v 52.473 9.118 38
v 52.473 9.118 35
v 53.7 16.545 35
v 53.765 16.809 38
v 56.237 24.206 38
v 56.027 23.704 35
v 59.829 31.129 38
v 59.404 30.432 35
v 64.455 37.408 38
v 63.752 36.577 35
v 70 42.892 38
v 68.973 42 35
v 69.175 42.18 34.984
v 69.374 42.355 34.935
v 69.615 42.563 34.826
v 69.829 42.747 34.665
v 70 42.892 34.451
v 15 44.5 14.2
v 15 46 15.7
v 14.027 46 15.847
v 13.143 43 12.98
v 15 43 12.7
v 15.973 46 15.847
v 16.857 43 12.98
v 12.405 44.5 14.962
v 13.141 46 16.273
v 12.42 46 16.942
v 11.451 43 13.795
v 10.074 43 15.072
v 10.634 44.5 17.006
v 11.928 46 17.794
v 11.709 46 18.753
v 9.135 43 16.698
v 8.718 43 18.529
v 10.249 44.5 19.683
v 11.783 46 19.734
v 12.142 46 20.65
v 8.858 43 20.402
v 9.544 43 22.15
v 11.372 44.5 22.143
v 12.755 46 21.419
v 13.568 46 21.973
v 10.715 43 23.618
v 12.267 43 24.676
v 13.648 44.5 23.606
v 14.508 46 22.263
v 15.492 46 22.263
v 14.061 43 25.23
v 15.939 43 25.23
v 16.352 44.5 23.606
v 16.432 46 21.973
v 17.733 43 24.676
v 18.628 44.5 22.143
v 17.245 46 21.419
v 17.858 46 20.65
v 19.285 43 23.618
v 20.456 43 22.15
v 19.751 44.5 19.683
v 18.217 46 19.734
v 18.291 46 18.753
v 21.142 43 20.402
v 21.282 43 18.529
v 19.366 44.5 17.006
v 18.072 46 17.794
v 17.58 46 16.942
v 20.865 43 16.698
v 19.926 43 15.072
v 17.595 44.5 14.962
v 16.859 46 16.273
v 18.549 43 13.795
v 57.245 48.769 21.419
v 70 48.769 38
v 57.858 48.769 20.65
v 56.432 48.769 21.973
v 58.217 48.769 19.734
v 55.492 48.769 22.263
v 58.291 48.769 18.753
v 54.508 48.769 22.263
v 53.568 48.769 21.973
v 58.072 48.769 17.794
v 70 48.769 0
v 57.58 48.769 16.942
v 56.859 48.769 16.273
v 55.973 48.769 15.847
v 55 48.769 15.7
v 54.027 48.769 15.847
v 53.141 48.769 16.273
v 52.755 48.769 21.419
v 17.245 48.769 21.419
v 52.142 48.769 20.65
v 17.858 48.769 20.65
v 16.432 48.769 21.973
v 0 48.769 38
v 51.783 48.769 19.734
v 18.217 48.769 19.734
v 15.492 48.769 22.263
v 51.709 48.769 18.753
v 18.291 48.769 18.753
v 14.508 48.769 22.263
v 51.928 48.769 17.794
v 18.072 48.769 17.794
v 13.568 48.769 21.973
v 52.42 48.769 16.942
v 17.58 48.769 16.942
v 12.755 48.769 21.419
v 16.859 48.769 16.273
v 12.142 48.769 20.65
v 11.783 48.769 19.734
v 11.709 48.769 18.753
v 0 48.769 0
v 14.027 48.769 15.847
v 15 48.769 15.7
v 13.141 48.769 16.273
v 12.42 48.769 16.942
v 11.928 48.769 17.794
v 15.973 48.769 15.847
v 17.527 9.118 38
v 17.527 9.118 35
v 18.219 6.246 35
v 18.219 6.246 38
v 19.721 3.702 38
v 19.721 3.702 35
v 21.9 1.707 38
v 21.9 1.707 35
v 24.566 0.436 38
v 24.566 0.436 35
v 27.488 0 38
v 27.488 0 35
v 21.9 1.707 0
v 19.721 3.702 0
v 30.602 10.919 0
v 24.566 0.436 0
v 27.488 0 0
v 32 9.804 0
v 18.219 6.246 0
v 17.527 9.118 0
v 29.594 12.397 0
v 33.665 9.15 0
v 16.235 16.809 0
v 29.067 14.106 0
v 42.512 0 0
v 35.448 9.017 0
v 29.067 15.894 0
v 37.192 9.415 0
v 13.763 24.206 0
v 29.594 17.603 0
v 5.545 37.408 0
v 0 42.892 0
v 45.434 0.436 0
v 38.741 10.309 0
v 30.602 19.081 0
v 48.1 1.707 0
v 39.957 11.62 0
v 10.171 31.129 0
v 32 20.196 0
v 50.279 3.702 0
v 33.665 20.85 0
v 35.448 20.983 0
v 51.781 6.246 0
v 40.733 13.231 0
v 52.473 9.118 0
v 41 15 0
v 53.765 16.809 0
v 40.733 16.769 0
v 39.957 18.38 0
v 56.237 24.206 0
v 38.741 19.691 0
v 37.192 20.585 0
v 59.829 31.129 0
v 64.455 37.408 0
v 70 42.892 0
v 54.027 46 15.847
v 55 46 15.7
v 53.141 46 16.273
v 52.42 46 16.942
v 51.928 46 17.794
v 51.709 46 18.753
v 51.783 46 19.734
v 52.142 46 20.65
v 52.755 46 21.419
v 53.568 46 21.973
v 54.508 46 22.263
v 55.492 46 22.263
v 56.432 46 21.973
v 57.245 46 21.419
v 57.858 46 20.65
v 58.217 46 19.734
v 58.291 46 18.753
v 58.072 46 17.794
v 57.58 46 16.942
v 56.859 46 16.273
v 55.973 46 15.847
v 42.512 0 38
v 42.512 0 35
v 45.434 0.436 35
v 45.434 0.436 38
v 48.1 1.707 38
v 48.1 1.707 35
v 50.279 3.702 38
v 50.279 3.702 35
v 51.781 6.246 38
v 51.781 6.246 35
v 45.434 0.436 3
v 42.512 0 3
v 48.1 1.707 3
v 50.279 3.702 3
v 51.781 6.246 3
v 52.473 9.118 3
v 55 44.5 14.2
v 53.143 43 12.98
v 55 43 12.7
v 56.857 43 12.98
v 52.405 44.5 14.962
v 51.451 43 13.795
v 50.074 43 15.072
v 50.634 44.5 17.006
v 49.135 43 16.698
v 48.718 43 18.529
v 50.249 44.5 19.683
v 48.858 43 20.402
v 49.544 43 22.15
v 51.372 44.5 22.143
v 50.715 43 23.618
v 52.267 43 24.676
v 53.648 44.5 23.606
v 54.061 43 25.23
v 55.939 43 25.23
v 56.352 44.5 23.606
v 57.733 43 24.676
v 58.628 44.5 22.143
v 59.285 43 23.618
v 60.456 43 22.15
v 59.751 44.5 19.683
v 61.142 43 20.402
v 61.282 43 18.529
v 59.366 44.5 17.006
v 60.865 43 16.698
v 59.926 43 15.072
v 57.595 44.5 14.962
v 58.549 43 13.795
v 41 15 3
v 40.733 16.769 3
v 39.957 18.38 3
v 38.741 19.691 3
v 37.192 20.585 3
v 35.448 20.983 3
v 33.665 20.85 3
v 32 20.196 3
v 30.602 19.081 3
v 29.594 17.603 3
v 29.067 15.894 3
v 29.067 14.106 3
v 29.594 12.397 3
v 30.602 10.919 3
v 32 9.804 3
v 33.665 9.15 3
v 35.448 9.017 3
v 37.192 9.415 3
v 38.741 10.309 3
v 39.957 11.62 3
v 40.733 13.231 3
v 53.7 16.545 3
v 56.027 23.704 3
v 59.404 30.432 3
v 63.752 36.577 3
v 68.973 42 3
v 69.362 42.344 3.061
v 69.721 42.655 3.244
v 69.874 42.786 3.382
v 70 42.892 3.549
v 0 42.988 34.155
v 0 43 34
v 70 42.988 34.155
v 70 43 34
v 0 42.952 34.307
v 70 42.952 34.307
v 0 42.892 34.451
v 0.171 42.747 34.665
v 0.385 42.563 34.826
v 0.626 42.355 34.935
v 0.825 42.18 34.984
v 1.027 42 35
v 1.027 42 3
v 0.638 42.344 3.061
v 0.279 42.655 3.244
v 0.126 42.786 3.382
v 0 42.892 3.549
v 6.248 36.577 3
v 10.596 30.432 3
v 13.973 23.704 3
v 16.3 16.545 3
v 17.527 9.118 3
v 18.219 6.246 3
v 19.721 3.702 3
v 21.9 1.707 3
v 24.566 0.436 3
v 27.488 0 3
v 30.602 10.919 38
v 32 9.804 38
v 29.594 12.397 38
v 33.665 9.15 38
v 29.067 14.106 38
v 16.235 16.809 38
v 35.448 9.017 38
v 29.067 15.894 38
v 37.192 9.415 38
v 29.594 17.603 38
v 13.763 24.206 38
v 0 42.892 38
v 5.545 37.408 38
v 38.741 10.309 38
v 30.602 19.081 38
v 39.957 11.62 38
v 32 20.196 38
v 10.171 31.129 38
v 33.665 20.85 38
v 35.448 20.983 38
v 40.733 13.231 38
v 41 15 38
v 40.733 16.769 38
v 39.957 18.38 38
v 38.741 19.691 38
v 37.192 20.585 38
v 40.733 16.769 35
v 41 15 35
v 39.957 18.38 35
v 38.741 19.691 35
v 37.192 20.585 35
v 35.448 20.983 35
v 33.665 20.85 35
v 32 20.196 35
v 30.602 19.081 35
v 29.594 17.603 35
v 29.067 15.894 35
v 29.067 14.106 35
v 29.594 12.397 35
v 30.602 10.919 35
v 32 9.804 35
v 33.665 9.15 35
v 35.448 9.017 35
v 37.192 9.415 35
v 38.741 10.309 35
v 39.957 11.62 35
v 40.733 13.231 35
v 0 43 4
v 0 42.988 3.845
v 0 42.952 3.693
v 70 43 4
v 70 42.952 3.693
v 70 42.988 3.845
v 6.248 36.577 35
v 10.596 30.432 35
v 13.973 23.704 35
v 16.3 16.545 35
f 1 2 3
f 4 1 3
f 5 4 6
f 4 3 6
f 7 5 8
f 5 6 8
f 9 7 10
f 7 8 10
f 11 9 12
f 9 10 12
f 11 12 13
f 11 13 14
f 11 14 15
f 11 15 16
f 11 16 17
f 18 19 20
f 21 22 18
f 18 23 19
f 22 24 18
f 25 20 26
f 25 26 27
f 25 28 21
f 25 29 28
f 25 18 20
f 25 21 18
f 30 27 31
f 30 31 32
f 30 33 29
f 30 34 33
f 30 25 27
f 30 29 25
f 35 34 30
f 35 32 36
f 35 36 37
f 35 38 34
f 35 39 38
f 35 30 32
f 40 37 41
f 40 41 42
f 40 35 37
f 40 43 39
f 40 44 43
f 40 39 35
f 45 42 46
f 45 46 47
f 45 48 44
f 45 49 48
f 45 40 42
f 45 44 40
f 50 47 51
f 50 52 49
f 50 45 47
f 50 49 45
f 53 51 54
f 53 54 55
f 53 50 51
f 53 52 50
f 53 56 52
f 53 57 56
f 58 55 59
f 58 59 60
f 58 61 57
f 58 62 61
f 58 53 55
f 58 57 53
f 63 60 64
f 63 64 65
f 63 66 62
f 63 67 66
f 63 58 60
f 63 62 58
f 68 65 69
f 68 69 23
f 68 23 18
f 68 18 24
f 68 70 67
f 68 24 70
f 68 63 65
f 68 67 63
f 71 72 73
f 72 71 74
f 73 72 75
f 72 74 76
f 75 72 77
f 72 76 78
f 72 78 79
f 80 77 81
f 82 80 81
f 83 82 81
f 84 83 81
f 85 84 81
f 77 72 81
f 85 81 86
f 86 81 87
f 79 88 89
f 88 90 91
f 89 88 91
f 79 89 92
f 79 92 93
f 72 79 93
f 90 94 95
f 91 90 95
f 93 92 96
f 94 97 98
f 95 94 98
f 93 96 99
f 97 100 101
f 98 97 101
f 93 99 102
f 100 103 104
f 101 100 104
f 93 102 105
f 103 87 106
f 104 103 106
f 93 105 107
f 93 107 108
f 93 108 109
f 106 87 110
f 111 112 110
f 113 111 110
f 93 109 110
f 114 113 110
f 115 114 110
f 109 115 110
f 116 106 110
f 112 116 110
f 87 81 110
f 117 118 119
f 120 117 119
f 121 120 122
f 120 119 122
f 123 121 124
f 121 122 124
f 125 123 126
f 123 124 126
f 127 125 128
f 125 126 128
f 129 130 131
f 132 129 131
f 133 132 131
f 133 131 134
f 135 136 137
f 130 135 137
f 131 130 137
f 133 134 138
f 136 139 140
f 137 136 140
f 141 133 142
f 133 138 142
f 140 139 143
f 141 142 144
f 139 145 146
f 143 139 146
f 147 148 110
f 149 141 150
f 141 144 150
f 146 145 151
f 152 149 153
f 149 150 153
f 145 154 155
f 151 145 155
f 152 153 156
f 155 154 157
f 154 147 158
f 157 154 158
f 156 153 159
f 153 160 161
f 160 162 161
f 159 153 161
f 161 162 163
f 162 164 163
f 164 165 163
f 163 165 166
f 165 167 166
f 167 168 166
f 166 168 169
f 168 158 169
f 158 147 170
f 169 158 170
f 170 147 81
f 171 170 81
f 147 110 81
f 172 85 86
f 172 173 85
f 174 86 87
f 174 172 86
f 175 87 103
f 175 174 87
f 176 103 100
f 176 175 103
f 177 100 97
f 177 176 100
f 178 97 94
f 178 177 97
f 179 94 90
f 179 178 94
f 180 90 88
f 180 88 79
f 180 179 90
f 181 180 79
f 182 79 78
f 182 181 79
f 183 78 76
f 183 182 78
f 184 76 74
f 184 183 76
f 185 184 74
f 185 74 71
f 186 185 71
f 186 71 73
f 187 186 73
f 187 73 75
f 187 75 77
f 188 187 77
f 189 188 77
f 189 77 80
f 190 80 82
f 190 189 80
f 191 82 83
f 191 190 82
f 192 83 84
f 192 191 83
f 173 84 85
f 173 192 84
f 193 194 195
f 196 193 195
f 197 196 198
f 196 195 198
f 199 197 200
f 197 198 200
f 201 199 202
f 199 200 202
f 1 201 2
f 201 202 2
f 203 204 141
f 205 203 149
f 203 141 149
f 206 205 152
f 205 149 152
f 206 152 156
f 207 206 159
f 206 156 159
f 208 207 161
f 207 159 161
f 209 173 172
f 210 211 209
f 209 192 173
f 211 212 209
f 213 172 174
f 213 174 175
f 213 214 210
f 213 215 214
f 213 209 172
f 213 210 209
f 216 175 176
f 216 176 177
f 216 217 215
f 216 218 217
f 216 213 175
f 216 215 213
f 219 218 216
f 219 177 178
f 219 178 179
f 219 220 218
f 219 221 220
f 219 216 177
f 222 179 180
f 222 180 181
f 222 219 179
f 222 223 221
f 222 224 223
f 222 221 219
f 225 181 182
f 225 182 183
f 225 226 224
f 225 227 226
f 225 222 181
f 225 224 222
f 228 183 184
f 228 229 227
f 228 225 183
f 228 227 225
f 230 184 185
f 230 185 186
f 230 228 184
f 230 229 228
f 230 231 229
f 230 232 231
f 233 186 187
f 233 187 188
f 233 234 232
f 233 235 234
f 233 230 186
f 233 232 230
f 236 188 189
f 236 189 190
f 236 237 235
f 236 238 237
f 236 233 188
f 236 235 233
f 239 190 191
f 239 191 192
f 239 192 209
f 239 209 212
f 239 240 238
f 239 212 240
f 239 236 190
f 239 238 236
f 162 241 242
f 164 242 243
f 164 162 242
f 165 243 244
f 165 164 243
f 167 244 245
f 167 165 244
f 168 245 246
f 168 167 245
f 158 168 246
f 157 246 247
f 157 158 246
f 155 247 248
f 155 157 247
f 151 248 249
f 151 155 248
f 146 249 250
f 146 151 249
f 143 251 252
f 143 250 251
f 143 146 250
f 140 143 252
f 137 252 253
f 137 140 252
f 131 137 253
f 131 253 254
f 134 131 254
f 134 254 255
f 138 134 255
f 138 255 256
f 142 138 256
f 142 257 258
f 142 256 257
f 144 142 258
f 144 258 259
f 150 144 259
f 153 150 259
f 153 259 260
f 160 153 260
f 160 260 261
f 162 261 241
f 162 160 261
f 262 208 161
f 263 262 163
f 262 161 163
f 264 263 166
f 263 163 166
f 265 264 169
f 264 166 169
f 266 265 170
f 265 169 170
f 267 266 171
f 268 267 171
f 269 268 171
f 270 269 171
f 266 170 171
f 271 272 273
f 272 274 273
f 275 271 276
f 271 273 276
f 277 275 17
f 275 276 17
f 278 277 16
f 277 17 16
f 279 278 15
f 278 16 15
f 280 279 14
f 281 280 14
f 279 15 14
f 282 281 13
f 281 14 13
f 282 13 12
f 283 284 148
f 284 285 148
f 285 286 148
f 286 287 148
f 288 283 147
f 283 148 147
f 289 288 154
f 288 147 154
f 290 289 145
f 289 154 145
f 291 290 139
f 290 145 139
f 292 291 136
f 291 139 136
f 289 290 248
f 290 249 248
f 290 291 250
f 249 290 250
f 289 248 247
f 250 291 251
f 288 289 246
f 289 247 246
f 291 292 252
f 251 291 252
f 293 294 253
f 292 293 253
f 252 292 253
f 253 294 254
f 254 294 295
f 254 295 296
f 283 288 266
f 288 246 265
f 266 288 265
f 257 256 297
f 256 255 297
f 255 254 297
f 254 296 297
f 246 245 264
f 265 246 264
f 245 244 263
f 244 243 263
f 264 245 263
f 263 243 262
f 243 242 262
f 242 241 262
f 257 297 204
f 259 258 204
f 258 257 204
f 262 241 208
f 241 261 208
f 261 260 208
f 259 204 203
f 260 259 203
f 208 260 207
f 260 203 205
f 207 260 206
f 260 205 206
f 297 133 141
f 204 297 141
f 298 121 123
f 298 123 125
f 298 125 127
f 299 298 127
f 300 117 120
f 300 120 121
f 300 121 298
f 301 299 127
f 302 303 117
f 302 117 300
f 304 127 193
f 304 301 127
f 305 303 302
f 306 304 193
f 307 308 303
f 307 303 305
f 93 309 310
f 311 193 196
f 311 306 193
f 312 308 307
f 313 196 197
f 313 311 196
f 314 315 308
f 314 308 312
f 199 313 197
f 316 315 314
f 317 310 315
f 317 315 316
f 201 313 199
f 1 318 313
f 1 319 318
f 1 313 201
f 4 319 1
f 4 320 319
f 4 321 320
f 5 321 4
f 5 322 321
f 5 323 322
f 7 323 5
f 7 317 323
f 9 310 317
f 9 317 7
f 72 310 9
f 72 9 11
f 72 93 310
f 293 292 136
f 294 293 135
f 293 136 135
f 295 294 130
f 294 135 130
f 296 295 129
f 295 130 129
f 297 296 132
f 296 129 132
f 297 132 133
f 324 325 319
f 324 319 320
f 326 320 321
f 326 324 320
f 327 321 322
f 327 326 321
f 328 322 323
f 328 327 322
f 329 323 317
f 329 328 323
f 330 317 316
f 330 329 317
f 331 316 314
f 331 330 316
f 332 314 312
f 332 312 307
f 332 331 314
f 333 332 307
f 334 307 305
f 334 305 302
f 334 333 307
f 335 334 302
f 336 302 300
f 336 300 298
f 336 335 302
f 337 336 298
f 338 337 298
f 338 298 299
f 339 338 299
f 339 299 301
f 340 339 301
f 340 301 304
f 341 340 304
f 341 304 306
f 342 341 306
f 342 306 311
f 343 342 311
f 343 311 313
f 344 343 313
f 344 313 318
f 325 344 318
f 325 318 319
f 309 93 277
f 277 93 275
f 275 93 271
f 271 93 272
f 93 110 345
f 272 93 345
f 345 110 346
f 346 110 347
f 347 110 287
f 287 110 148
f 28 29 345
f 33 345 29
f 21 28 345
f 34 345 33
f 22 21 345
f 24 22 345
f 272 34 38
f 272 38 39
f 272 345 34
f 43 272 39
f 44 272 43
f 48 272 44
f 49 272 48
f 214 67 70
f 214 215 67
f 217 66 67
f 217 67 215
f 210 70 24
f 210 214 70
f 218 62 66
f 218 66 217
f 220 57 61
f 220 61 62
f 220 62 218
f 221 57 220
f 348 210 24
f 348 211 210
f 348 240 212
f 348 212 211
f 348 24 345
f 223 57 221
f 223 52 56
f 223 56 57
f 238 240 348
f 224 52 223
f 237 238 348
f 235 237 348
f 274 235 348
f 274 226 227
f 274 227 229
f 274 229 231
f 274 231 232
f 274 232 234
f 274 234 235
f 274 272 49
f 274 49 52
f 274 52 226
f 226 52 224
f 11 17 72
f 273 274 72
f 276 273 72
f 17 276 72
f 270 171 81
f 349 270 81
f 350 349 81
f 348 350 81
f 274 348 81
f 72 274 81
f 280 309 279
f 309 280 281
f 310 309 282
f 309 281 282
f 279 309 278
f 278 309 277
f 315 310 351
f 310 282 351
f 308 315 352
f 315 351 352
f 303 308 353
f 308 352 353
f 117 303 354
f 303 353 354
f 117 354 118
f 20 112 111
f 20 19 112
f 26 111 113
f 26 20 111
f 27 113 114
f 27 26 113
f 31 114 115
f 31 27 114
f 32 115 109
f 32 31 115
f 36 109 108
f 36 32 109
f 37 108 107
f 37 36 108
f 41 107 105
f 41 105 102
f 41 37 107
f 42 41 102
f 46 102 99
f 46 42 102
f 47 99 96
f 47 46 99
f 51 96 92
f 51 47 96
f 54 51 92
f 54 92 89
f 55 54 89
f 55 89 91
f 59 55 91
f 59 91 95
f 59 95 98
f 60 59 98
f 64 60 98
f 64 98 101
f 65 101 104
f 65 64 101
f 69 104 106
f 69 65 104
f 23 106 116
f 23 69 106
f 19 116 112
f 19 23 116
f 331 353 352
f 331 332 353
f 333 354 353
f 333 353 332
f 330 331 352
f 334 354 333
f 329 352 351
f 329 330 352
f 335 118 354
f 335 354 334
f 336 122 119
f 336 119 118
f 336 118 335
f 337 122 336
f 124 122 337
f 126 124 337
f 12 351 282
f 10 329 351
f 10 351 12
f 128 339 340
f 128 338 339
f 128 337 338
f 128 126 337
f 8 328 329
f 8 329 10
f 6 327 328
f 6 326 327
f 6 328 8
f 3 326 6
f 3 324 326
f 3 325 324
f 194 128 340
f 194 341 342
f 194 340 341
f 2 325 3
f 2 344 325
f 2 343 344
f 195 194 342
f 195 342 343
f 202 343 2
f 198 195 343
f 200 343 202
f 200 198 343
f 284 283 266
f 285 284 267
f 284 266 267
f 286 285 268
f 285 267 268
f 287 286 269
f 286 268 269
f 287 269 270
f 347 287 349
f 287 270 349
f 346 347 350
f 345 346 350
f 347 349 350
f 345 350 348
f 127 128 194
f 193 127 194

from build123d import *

# Parameters (mm, degrees)
SZKIC1_R                                 = 6
DODANIE_WYCI_GNI_CIE1_DEPTH              = 38
SZKIC2_W                                 = 70
SZKIC2_H                                 = 32
WYTNIJ_WYCI_GNI_CIE1_DEPTH               = 43
ZAOKR_GLENIE1_R                          = 1
POG_BIENIE_STO_KOWE_POD_M6_RUB_Z_2_COUNT = 2
POG_BIENIE_STO_KOWE_POD_M6_RUB_Z_2_PITCH = 40


with BuildPart() as part:
    # Szkic1 → Dodanie-wyciągnięcie1 (new body)
    with BuildSketch(Plane.XY):
        with BuildLine():
            Line((0, 48.768640881), (0, 42.89244343))
            ThreePointArc((0, 42.89244343), (12.102069866, 27.737632724), (17.527104902, 9.1178213))
            ThreePointArc((17.527104902, 9.1178213), (20.736146372, 2.623625993), (27.488116936, 0))
            Line((27.488116936, 0), (42.511883064, 0))
            ThreePointArc((42.511883064, 0), (49.263853628, 2.623625993), (52.472895098, 9.1178213))
            ThreePointArc((52.472895098, 9.1178213), (57.897930134, 27.737632724), (70, 42.89244343))
            Line((70, 42.89244343), (70, 48.768640881))
            Line((70, 48.768640881), (0, 48.768640881))
        make_face()
        with Locations((35, 15)):
            Circle(SZKIC1_R, mode=Mode.SUBTRACT)
    extrude(amount=DODANIE_WYCI_GNI_CIE1_DEPTH)

    # Szkic2 → Wytnij-wyciągnięcie1 (cut)
    with BuildSketch(Plane.XZ):
        with Locations((35, 19)):
            Rectangle(SZKIC2_W, SZKIC2_H)
    extrude(amount=-WYTNIJ_WYCI_GNI_CIE1_DEPTH, mode=Mode.SUBTRACT)

    # Zaokrąglenie1
    zaokr_glenie1_edges = [part.edges().sort_by_distance(p)[0] for p in [
        (35, 43, 35),
        (35, 43, 3),
    ]]
    fillet(zaokr_glenie1_edges, radius=ZAOKR_GLENIE1_R)

    # Szkic5 → Pogłębienie stożkowe pod M6 Śrubę z łbem soczewkowym1 (revolve, cut)
    with BuildSketch(Plane(origin=(15, 43, 19), x_dir=(0, 0, -1), z_dir=(1, 0, 0))):
        Polygon((0, 0), (0, 5.768640881), (3.3, 5.768640881), (3.3, 3), (6.3, 0), align=None)
    pog_bienie_sto_kowe_pod_m6_rub_z_bem = revolve(axis=Axis((15, 36.65, 19), (0, 1, 0)), mode=Mode.SUBTRACT)

    # Pog_bienie sto_kowe pod M6 _rub_ z _ 2: Pogłębienie stożkowe pod M6 Śrubę z łbem soczewkowym1 ×2
    with Locations(*[(i * POG_BIENIE_STO_KOWE_POD_M6_RUB_Z_2_PITCH, 0, 0) for i in range(1, POG_BIENIE_STO_KOWE_POD_M6_RUB_Z_2_COUNT)]):
        add(pog_bienie_sto_kowe_pod_m6_rub_z_bem, mode=Mode.SUBTRACT)


solid = part.part
